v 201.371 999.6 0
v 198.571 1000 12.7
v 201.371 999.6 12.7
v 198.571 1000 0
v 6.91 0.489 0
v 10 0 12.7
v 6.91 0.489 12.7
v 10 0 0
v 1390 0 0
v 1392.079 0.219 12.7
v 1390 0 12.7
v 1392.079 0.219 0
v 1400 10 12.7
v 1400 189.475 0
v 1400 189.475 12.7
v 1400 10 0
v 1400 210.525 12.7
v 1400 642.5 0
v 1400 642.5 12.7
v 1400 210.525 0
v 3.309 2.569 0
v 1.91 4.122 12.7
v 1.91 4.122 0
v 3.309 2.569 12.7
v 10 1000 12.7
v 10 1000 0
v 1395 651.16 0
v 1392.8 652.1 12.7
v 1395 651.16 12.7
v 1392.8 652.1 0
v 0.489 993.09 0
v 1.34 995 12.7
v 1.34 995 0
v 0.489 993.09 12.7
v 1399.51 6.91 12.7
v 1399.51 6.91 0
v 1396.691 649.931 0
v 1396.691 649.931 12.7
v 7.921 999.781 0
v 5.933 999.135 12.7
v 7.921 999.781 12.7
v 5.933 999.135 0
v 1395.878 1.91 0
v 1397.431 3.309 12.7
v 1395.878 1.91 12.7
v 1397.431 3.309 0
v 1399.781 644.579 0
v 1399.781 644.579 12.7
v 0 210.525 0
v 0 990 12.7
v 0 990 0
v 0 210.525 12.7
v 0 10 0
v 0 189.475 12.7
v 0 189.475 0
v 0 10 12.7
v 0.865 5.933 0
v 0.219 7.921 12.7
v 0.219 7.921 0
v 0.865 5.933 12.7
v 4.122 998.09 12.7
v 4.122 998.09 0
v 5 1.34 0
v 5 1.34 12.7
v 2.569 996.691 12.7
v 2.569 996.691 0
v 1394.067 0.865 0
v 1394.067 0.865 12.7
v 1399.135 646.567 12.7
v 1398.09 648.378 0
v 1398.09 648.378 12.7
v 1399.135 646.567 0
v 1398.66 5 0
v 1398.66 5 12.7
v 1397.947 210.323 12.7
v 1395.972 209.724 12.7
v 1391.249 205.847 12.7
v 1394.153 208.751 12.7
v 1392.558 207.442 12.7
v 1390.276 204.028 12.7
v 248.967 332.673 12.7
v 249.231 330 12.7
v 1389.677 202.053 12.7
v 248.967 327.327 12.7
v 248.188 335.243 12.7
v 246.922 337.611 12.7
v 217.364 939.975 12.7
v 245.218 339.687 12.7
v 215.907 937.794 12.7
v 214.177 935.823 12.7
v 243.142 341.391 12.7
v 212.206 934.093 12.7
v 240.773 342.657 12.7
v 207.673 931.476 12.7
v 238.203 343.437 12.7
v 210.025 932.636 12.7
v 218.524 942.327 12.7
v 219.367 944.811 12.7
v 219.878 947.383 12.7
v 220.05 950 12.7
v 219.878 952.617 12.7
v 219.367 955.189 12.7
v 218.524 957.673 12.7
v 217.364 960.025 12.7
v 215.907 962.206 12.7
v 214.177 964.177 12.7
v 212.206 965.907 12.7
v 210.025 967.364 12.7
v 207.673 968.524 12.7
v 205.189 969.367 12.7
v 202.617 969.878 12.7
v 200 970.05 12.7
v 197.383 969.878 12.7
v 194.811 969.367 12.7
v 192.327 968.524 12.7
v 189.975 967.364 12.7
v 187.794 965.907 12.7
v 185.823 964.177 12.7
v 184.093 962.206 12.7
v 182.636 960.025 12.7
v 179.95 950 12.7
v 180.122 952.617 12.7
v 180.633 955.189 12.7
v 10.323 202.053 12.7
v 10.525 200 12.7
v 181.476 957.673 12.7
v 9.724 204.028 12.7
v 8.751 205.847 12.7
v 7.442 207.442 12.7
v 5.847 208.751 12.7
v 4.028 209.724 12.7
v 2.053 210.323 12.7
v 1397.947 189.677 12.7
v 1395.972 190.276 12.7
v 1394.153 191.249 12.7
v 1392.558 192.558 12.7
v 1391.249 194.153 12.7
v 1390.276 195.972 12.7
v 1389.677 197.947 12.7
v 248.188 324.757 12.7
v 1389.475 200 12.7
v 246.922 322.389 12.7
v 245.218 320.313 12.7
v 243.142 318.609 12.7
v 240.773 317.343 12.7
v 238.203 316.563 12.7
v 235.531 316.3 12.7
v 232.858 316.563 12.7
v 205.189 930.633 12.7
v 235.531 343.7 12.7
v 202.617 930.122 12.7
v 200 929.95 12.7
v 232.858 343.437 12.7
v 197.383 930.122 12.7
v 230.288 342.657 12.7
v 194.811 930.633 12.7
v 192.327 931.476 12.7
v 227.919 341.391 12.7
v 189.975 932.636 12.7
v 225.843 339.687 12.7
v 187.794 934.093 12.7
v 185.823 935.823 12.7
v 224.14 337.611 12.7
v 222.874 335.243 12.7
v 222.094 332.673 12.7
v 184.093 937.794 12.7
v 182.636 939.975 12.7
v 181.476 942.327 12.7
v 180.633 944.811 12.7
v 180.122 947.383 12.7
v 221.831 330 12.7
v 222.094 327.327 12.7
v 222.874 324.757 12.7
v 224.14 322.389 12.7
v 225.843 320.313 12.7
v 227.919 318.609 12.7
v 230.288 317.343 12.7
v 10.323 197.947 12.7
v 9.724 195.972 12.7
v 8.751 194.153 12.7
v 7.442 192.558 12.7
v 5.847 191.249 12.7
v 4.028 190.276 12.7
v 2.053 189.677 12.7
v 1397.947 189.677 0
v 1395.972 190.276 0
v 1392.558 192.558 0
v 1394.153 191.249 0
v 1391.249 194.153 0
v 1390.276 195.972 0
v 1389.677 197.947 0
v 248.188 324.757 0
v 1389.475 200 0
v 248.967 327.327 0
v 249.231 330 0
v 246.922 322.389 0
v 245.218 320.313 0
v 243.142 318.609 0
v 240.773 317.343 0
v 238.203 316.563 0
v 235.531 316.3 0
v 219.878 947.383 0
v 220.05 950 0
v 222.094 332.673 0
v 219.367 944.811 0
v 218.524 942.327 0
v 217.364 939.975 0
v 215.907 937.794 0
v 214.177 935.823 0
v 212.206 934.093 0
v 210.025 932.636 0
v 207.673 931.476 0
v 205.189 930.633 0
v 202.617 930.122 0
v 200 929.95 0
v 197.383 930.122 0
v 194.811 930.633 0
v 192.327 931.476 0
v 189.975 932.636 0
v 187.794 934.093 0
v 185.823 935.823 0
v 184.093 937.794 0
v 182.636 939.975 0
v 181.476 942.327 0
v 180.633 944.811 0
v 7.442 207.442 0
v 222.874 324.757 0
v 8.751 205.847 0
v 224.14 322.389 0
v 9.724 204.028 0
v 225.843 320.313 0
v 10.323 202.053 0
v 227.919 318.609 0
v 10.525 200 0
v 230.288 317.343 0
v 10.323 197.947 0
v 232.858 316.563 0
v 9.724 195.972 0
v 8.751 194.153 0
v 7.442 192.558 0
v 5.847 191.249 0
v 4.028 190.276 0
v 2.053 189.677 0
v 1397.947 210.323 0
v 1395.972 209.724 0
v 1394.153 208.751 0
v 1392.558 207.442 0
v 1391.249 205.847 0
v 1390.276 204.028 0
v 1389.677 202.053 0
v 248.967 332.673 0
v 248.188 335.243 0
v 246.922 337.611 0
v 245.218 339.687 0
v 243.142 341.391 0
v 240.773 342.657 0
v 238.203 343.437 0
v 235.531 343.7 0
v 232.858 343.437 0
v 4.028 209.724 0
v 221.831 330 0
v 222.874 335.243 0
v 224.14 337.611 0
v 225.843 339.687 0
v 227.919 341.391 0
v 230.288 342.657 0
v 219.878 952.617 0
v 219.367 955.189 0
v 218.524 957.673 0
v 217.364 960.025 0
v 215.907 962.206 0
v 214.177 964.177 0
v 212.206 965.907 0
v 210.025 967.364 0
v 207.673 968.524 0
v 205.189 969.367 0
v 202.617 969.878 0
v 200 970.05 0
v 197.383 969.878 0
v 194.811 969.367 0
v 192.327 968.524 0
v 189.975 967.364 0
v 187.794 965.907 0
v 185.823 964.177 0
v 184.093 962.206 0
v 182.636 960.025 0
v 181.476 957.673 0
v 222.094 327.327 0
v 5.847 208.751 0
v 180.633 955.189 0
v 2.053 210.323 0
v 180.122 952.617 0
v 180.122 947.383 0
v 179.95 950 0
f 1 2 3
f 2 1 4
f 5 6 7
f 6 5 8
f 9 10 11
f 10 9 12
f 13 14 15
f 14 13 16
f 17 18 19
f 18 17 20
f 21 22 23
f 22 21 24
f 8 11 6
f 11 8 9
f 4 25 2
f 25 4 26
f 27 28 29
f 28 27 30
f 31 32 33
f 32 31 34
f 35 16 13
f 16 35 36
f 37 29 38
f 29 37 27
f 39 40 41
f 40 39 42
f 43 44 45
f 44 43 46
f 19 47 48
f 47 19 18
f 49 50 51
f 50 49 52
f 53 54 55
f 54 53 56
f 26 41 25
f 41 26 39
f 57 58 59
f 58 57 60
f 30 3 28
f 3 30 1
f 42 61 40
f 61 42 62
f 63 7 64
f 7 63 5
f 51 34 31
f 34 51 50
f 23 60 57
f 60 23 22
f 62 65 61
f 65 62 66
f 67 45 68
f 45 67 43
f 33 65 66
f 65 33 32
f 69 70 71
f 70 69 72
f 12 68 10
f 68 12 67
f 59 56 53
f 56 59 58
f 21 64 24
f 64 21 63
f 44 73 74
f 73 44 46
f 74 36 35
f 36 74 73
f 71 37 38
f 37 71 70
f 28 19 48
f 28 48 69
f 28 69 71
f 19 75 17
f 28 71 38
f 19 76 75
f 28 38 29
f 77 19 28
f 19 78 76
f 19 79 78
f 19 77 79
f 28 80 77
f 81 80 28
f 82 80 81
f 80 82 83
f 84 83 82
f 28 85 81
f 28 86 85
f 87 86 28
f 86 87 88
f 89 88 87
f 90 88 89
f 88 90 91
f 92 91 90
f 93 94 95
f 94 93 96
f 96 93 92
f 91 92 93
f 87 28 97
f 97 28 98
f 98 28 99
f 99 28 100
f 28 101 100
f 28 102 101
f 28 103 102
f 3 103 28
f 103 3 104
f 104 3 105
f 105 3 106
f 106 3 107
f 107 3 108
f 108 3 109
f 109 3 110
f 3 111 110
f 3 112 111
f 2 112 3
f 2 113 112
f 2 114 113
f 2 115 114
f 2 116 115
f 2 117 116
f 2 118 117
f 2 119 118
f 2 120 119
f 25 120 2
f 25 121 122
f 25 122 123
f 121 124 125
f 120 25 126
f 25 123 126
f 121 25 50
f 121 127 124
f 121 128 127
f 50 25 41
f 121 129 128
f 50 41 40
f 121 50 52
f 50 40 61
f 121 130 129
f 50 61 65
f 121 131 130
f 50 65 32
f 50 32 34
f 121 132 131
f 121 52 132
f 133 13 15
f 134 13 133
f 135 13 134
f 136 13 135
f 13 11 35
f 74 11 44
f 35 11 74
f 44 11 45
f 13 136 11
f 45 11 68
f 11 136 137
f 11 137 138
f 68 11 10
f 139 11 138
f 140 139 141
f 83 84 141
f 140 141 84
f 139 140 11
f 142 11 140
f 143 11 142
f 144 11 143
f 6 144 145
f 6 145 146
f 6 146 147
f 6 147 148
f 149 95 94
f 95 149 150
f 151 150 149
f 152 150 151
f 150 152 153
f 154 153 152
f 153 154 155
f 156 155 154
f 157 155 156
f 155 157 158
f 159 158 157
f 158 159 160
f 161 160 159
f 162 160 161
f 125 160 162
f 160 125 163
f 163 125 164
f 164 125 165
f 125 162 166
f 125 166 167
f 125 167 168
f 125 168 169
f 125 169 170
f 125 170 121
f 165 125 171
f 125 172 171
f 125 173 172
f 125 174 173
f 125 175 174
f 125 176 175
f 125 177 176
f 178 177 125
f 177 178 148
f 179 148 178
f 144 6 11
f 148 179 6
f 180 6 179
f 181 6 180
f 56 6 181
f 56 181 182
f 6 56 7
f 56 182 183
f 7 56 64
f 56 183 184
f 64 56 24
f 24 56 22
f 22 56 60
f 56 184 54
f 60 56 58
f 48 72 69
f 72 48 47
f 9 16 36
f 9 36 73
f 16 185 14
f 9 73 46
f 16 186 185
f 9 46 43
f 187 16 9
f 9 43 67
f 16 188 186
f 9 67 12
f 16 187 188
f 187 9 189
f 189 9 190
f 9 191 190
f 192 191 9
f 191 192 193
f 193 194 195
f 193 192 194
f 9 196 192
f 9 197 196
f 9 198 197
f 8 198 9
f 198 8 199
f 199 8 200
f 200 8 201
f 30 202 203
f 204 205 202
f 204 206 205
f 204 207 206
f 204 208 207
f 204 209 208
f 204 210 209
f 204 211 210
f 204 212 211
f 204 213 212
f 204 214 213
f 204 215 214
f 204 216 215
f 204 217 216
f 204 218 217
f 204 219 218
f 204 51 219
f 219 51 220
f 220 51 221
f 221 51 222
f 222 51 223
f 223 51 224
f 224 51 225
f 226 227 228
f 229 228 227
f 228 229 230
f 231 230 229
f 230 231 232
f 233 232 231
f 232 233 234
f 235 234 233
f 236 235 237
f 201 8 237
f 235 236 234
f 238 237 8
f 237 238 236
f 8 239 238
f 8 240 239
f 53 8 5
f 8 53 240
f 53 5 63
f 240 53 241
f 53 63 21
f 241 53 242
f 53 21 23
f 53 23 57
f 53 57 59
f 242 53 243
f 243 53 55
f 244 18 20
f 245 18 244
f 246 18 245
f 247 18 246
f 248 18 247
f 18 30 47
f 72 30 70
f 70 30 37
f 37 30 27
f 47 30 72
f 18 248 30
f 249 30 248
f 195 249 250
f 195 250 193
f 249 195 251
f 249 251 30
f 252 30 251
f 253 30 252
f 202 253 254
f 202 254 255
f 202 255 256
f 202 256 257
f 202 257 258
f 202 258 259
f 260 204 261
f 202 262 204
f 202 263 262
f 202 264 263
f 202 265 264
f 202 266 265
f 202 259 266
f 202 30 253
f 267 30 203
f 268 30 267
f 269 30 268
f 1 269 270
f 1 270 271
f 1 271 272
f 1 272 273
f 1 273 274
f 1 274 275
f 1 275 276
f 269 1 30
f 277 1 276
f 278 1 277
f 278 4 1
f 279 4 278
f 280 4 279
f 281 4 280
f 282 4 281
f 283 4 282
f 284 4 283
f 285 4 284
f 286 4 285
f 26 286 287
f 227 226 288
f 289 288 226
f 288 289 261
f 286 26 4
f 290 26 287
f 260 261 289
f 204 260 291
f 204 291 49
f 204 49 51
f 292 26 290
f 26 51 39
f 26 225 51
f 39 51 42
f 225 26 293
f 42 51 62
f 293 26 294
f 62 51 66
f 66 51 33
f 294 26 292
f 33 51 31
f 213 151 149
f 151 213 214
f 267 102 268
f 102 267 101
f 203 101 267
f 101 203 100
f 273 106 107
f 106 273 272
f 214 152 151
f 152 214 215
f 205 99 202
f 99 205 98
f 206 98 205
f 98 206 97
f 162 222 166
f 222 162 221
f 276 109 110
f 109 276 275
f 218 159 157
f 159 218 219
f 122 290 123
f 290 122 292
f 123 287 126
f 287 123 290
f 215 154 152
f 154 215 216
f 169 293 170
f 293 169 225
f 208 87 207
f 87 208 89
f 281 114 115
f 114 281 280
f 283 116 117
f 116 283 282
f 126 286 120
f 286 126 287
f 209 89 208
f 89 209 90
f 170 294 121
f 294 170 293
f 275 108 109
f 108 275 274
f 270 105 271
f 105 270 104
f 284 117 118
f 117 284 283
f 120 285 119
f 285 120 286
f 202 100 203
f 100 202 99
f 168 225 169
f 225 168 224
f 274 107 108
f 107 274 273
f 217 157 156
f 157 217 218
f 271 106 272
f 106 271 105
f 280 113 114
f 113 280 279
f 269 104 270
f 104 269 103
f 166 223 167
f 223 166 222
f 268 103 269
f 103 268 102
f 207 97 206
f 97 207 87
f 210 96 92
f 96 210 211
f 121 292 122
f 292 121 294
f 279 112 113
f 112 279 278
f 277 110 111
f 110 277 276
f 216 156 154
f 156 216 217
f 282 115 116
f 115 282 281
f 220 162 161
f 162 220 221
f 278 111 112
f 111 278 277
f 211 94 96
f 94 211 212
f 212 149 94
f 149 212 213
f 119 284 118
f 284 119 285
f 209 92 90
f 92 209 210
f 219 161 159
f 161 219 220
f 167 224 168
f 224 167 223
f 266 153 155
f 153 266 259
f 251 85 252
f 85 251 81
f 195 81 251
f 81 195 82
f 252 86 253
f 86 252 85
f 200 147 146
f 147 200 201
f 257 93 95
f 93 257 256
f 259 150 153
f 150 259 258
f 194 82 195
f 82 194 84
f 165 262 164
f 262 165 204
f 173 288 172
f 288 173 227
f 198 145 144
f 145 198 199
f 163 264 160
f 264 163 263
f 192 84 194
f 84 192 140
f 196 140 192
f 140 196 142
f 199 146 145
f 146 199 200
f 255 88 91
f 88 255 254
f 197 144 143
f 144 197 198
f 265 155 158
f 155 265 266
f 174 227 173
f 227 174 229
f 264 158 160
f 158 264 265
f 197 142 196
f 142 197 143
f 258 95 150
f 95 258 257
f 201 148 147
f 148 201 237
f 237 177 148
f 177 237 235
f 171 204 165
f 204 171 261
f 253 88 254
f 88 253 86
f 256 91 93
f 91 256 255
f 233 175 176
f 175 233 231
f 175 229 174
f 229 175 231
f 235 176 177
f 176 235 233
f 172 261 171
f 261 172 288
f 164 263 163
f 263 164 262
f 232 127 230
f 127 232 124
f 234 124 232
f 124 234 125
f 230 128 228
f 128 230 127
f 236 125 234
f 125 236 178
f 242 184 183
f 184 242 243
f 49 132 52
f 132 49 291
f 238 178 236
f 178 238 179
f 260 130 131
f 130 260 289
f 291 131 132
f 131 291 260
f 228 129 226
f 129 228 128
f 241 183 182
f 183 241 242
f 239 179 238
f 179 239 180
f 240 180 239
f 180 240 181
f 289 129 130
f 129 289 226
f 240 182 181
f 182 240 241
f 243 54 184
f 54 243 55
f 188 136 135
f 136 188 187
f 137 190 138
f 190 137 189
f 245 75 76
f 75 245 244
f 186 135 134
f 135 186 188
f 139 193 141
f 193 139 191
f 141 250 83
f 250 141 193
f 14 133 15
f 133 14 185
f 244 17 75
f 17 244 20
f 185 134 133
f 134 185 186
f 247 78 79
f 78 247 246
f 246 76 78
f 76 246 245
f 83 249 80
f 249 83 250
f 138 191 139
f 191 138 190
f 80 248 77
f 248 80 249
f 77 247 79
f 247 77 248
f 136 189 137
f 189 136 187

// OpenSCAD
// side_panel.scad
// Triangular side panel for LifeTrac v25
// This is the main structural plate that forms the sides of the machine
// Part of the "sandwich" design with 4 panels total (2 inner, 2 outer)

// Include necessary parameters from main assembly
include <../lifetrac_v25_params.scad>

// Triangular profile for side panels
// Tall end at rear (Y=0), shorter sloped end at front (Y=WHEEL_BASE)
module side_panel_profile() {
    offset(r=10) offset(r=-10)  // Rounded corners
    polygon([
        [0, 0],                              // Rear bottom
        [WHEEL_BASE, 0],                     // Front bottom
        [WHEEL_BASE, MACHINE_HEIGHT * 0.65], // Front top (sloped down)
        [200, MACHINE_HEIGHT],               // Near-rear top (arm pivot area)
        [0, MACHINE_HEIGHT]                  // Rear top (full height)
    ]);
}

// Arc slot cutout for cross beam clearance
// Creates an arc-shaped slot that allows the cross beam to rotate through
module cross_beam_arc_slot(beam_distance, slot_width) {
    // Pivot point in panel local coordinates
    pivot_x = PIVOT_PANEL_X;
    pivot_y = PIVOT_PANEL_Y;
    
    // Arc radius = distance from pivot to cross beam center
    arc_radius = beam_distance;
    
    // Half-width of the slot (beam size + clearance)
    half_slot = slot_width / 2;
    
    // Generate arc by rotating around pivot
    // The arc sweeps from ARM_MIN_ANGLE to ARM_MAX_ANGLE
    // We extend slightly beyond to ensure full clearance
    arc_start = ARM_MIN_ANGLE - 5;
    arc_end = ARM_MAX_ANGLE + 5;
    arc_steps = 60;
    
    translate([pivot_x, pivot_y])
    for (i = [0:arc_steps-1]) {
        angle1 = arc_start + i * (arc_end - arc_start) / arc_steps;
        angle2 = arc_start + (i + 1) * (arc_end - arc_start) / arc_steps;
        
        // Inner and outer points for this arc segment
        hull() {
            // Point at angle1, inner radius
            translate([(arc_radius - half_slot) * cos(angle1), (arc_radius - half_slot) * sin(angle1)])
            circle(d=5, $fn=8);
            
            // Point at angle1, outer radius
            translate([(arc_radius + half_slot) * cos(angle1), (arc_radius + half_slot) * sin(angle1)])
            circle(d=5, $fn=8);
            
            // Point at angle2, inner radius
            translate([(arc_radius - half_slot) * cos(angle2), (arc_radius - half_slot) * sin(angle2)])
            circle(d=5, $fn=8);
            
            // Point at angle2, outer radius
            translate([(arc_radius + half_slot) * cos(angle2), (arc_radius + half_slot) * sin(angle2)])
            circle(d=5, $fn=8);
        }
    }
}

// Main side panel module with all features (holes, slots)
// is_inner: true for inner panels (with arc slots), false for outer panels
module side_panel(is_inner = false) {
    slot_width = CROSS_BEAM_SIZE + 2 * CROSS_BEAM_CLEARANCE;  // Total slot width with clearance
    
    difference() {
        linear_extrude(height=PANEL_THICKNESS)
        difference() {
            side_panel_profile();
            
            // Cross beam arc slots (only on inner panels)
            if (is_inner) {
                // First cross beam slot (near pivot)
                cross_beam_arc_slot(CROSS_BEAM_1_POS, slot_width);
                
                // Second cross beam slot (near bucket) - only if it intersects the panel
                // The second beam is far forward and may not need a cutout
                // Check if any part of the arc passes through the panel
                if (CROSS_BEAM_2_POS < WHEEL_BASE + 200) {
                    cross_beam_arc_slot(CROSS_BEAM_2_POS, slot_width);
                }
            }
        }
        
        // Arm pivot hole near rear top (where the tall section is)
        // Position matches ARM_PIVOT_Y in world coordinates
        translate([ARM_PIVOT_Y, MACHINE_HEIGHT - 50, PANEL_THICKNESS/2])
        cylinder(d=PIVOT_PIN_DIA + 2, h=PANEL_THICKNESS+4, center=true, $fn=48);
        
        // Lift cylinder base mount hole (on both inner and outer panels)
        // Position matches LIFT_CYL_BASE_Y in world coordinates (Y=0 is rear)
        translate([LIFT_CYL_BASE_Y, LIFT_CYL_BASE_Z - FRAME_Z_OFFSET, PANEL_THICKNESS/2])
        cylinder(d=BOLT_DIA_1 + 2, h=PANEL_THICKNESS+4, center=true, $fn=32);
        
        // Wheel axle holes
        translate([0, WHEEL_DIAMETER/2 - 50, PANEL_THICKNESS/2])
        cylinder(d=BOLT_DIA_3_4 + 2, h=PANEL_THICKNESS+4, center=true, $fn=32);
        
        translate([WHEEL_BASE, WHEEL_DIAMETER/2 - 50, PANEL_THICKNESS/2])
        cylinder(d=BOLT_DIA_3_4 + 2, h=PANEL_THICKNESS+4, center=true, $fn=32);
        
        // =================================================================
        // FOLDING PLATFORM PIVOT HOLES (inner panels only)
        // =================================================================
        // These holes allow the platform pivot pin to pass through
        // Located near rear of panel, but clear of stiffener cutout zone
        // Stiffener cutout extends to X=31.75 in panel coords, so pivot must be beyond that
        // X position in panel coords = Y position in world coords
        // Y position in panel coords = Z position in world coords - FRAME_Z_OFFSET
        if (is_inner) {
            // Pivot Y position in world coords (clear of stiffener zone)
            pivot_world_y = PLATFORM_MOUNT_Y;  // Parametric forward position
            pivot_panel_x = pivot_world_y;  // Panel X = world Y
            pivot_panel_y = PLATFORM_PIVOT_HEIGHT - FRAME_Z_OFFSET;  // Panel Y = world Z - offset
            
            // Main pivot pin hole (1" + clearance)
            translate([pivot_panel_x, pivot_panel_y, PANEL_THICKNESS/2])
            cylinder(d=PLATFORM_PIVOT_PIN_DIA + PLATFORM_BOLT_CLEARANCE, 
                     h=PANEL_THICKNESS+4, center=true, $fn=48);
            
            // Deployed position lock pin hole (below pivot in Z = below in panel Y)
            translate([pivot_panel_x, pivot_panel_y - PLATFORM_LOCK_OFFSET, PANEL_THICKNESS/2])
            cylinder(d=PLATFORM_LOCK_PIN_DIA + PLATFORM_BOLT_CLEARANCE, 
                     h=PANEL_THICKNESS+4, center=true, $fn=32);
            
            // Stowed position lock pin hole (toward rear in Y = toward X=0 in panel)
            // When stowed, arm extends upward, lock pin aligns with arm end
            // This hole is at same Z as pivot but closer to rear
            stowed_lock_panel_x = pivot_panel_x - PLATFORM_ARM_LENGTH * 0.3;  // Offset toward rear
            if (stowed_lock_panel_x > 35) {  // Only if clear of stiffener cutout
                translate([stowed_lock_panel_x, pivot_panel_y + PLATFORM_ARM_LENGTH, PANEL_THICKNESS/2])
                cylinder(d=PLATFORM_LOCK_PIN_DIA + PLATFORM_BOLT_CLEARANCE, 
                         h=PANEL_THICKNESS+4, center=true, $fn=32);
            }
        }
    }
}

// Render the part for preview/export
if ($preview || len(search("side_panel.scad", parent_modules())) == 0) {
    side_panel(is_inner = false);  // Default to outer panel
}
